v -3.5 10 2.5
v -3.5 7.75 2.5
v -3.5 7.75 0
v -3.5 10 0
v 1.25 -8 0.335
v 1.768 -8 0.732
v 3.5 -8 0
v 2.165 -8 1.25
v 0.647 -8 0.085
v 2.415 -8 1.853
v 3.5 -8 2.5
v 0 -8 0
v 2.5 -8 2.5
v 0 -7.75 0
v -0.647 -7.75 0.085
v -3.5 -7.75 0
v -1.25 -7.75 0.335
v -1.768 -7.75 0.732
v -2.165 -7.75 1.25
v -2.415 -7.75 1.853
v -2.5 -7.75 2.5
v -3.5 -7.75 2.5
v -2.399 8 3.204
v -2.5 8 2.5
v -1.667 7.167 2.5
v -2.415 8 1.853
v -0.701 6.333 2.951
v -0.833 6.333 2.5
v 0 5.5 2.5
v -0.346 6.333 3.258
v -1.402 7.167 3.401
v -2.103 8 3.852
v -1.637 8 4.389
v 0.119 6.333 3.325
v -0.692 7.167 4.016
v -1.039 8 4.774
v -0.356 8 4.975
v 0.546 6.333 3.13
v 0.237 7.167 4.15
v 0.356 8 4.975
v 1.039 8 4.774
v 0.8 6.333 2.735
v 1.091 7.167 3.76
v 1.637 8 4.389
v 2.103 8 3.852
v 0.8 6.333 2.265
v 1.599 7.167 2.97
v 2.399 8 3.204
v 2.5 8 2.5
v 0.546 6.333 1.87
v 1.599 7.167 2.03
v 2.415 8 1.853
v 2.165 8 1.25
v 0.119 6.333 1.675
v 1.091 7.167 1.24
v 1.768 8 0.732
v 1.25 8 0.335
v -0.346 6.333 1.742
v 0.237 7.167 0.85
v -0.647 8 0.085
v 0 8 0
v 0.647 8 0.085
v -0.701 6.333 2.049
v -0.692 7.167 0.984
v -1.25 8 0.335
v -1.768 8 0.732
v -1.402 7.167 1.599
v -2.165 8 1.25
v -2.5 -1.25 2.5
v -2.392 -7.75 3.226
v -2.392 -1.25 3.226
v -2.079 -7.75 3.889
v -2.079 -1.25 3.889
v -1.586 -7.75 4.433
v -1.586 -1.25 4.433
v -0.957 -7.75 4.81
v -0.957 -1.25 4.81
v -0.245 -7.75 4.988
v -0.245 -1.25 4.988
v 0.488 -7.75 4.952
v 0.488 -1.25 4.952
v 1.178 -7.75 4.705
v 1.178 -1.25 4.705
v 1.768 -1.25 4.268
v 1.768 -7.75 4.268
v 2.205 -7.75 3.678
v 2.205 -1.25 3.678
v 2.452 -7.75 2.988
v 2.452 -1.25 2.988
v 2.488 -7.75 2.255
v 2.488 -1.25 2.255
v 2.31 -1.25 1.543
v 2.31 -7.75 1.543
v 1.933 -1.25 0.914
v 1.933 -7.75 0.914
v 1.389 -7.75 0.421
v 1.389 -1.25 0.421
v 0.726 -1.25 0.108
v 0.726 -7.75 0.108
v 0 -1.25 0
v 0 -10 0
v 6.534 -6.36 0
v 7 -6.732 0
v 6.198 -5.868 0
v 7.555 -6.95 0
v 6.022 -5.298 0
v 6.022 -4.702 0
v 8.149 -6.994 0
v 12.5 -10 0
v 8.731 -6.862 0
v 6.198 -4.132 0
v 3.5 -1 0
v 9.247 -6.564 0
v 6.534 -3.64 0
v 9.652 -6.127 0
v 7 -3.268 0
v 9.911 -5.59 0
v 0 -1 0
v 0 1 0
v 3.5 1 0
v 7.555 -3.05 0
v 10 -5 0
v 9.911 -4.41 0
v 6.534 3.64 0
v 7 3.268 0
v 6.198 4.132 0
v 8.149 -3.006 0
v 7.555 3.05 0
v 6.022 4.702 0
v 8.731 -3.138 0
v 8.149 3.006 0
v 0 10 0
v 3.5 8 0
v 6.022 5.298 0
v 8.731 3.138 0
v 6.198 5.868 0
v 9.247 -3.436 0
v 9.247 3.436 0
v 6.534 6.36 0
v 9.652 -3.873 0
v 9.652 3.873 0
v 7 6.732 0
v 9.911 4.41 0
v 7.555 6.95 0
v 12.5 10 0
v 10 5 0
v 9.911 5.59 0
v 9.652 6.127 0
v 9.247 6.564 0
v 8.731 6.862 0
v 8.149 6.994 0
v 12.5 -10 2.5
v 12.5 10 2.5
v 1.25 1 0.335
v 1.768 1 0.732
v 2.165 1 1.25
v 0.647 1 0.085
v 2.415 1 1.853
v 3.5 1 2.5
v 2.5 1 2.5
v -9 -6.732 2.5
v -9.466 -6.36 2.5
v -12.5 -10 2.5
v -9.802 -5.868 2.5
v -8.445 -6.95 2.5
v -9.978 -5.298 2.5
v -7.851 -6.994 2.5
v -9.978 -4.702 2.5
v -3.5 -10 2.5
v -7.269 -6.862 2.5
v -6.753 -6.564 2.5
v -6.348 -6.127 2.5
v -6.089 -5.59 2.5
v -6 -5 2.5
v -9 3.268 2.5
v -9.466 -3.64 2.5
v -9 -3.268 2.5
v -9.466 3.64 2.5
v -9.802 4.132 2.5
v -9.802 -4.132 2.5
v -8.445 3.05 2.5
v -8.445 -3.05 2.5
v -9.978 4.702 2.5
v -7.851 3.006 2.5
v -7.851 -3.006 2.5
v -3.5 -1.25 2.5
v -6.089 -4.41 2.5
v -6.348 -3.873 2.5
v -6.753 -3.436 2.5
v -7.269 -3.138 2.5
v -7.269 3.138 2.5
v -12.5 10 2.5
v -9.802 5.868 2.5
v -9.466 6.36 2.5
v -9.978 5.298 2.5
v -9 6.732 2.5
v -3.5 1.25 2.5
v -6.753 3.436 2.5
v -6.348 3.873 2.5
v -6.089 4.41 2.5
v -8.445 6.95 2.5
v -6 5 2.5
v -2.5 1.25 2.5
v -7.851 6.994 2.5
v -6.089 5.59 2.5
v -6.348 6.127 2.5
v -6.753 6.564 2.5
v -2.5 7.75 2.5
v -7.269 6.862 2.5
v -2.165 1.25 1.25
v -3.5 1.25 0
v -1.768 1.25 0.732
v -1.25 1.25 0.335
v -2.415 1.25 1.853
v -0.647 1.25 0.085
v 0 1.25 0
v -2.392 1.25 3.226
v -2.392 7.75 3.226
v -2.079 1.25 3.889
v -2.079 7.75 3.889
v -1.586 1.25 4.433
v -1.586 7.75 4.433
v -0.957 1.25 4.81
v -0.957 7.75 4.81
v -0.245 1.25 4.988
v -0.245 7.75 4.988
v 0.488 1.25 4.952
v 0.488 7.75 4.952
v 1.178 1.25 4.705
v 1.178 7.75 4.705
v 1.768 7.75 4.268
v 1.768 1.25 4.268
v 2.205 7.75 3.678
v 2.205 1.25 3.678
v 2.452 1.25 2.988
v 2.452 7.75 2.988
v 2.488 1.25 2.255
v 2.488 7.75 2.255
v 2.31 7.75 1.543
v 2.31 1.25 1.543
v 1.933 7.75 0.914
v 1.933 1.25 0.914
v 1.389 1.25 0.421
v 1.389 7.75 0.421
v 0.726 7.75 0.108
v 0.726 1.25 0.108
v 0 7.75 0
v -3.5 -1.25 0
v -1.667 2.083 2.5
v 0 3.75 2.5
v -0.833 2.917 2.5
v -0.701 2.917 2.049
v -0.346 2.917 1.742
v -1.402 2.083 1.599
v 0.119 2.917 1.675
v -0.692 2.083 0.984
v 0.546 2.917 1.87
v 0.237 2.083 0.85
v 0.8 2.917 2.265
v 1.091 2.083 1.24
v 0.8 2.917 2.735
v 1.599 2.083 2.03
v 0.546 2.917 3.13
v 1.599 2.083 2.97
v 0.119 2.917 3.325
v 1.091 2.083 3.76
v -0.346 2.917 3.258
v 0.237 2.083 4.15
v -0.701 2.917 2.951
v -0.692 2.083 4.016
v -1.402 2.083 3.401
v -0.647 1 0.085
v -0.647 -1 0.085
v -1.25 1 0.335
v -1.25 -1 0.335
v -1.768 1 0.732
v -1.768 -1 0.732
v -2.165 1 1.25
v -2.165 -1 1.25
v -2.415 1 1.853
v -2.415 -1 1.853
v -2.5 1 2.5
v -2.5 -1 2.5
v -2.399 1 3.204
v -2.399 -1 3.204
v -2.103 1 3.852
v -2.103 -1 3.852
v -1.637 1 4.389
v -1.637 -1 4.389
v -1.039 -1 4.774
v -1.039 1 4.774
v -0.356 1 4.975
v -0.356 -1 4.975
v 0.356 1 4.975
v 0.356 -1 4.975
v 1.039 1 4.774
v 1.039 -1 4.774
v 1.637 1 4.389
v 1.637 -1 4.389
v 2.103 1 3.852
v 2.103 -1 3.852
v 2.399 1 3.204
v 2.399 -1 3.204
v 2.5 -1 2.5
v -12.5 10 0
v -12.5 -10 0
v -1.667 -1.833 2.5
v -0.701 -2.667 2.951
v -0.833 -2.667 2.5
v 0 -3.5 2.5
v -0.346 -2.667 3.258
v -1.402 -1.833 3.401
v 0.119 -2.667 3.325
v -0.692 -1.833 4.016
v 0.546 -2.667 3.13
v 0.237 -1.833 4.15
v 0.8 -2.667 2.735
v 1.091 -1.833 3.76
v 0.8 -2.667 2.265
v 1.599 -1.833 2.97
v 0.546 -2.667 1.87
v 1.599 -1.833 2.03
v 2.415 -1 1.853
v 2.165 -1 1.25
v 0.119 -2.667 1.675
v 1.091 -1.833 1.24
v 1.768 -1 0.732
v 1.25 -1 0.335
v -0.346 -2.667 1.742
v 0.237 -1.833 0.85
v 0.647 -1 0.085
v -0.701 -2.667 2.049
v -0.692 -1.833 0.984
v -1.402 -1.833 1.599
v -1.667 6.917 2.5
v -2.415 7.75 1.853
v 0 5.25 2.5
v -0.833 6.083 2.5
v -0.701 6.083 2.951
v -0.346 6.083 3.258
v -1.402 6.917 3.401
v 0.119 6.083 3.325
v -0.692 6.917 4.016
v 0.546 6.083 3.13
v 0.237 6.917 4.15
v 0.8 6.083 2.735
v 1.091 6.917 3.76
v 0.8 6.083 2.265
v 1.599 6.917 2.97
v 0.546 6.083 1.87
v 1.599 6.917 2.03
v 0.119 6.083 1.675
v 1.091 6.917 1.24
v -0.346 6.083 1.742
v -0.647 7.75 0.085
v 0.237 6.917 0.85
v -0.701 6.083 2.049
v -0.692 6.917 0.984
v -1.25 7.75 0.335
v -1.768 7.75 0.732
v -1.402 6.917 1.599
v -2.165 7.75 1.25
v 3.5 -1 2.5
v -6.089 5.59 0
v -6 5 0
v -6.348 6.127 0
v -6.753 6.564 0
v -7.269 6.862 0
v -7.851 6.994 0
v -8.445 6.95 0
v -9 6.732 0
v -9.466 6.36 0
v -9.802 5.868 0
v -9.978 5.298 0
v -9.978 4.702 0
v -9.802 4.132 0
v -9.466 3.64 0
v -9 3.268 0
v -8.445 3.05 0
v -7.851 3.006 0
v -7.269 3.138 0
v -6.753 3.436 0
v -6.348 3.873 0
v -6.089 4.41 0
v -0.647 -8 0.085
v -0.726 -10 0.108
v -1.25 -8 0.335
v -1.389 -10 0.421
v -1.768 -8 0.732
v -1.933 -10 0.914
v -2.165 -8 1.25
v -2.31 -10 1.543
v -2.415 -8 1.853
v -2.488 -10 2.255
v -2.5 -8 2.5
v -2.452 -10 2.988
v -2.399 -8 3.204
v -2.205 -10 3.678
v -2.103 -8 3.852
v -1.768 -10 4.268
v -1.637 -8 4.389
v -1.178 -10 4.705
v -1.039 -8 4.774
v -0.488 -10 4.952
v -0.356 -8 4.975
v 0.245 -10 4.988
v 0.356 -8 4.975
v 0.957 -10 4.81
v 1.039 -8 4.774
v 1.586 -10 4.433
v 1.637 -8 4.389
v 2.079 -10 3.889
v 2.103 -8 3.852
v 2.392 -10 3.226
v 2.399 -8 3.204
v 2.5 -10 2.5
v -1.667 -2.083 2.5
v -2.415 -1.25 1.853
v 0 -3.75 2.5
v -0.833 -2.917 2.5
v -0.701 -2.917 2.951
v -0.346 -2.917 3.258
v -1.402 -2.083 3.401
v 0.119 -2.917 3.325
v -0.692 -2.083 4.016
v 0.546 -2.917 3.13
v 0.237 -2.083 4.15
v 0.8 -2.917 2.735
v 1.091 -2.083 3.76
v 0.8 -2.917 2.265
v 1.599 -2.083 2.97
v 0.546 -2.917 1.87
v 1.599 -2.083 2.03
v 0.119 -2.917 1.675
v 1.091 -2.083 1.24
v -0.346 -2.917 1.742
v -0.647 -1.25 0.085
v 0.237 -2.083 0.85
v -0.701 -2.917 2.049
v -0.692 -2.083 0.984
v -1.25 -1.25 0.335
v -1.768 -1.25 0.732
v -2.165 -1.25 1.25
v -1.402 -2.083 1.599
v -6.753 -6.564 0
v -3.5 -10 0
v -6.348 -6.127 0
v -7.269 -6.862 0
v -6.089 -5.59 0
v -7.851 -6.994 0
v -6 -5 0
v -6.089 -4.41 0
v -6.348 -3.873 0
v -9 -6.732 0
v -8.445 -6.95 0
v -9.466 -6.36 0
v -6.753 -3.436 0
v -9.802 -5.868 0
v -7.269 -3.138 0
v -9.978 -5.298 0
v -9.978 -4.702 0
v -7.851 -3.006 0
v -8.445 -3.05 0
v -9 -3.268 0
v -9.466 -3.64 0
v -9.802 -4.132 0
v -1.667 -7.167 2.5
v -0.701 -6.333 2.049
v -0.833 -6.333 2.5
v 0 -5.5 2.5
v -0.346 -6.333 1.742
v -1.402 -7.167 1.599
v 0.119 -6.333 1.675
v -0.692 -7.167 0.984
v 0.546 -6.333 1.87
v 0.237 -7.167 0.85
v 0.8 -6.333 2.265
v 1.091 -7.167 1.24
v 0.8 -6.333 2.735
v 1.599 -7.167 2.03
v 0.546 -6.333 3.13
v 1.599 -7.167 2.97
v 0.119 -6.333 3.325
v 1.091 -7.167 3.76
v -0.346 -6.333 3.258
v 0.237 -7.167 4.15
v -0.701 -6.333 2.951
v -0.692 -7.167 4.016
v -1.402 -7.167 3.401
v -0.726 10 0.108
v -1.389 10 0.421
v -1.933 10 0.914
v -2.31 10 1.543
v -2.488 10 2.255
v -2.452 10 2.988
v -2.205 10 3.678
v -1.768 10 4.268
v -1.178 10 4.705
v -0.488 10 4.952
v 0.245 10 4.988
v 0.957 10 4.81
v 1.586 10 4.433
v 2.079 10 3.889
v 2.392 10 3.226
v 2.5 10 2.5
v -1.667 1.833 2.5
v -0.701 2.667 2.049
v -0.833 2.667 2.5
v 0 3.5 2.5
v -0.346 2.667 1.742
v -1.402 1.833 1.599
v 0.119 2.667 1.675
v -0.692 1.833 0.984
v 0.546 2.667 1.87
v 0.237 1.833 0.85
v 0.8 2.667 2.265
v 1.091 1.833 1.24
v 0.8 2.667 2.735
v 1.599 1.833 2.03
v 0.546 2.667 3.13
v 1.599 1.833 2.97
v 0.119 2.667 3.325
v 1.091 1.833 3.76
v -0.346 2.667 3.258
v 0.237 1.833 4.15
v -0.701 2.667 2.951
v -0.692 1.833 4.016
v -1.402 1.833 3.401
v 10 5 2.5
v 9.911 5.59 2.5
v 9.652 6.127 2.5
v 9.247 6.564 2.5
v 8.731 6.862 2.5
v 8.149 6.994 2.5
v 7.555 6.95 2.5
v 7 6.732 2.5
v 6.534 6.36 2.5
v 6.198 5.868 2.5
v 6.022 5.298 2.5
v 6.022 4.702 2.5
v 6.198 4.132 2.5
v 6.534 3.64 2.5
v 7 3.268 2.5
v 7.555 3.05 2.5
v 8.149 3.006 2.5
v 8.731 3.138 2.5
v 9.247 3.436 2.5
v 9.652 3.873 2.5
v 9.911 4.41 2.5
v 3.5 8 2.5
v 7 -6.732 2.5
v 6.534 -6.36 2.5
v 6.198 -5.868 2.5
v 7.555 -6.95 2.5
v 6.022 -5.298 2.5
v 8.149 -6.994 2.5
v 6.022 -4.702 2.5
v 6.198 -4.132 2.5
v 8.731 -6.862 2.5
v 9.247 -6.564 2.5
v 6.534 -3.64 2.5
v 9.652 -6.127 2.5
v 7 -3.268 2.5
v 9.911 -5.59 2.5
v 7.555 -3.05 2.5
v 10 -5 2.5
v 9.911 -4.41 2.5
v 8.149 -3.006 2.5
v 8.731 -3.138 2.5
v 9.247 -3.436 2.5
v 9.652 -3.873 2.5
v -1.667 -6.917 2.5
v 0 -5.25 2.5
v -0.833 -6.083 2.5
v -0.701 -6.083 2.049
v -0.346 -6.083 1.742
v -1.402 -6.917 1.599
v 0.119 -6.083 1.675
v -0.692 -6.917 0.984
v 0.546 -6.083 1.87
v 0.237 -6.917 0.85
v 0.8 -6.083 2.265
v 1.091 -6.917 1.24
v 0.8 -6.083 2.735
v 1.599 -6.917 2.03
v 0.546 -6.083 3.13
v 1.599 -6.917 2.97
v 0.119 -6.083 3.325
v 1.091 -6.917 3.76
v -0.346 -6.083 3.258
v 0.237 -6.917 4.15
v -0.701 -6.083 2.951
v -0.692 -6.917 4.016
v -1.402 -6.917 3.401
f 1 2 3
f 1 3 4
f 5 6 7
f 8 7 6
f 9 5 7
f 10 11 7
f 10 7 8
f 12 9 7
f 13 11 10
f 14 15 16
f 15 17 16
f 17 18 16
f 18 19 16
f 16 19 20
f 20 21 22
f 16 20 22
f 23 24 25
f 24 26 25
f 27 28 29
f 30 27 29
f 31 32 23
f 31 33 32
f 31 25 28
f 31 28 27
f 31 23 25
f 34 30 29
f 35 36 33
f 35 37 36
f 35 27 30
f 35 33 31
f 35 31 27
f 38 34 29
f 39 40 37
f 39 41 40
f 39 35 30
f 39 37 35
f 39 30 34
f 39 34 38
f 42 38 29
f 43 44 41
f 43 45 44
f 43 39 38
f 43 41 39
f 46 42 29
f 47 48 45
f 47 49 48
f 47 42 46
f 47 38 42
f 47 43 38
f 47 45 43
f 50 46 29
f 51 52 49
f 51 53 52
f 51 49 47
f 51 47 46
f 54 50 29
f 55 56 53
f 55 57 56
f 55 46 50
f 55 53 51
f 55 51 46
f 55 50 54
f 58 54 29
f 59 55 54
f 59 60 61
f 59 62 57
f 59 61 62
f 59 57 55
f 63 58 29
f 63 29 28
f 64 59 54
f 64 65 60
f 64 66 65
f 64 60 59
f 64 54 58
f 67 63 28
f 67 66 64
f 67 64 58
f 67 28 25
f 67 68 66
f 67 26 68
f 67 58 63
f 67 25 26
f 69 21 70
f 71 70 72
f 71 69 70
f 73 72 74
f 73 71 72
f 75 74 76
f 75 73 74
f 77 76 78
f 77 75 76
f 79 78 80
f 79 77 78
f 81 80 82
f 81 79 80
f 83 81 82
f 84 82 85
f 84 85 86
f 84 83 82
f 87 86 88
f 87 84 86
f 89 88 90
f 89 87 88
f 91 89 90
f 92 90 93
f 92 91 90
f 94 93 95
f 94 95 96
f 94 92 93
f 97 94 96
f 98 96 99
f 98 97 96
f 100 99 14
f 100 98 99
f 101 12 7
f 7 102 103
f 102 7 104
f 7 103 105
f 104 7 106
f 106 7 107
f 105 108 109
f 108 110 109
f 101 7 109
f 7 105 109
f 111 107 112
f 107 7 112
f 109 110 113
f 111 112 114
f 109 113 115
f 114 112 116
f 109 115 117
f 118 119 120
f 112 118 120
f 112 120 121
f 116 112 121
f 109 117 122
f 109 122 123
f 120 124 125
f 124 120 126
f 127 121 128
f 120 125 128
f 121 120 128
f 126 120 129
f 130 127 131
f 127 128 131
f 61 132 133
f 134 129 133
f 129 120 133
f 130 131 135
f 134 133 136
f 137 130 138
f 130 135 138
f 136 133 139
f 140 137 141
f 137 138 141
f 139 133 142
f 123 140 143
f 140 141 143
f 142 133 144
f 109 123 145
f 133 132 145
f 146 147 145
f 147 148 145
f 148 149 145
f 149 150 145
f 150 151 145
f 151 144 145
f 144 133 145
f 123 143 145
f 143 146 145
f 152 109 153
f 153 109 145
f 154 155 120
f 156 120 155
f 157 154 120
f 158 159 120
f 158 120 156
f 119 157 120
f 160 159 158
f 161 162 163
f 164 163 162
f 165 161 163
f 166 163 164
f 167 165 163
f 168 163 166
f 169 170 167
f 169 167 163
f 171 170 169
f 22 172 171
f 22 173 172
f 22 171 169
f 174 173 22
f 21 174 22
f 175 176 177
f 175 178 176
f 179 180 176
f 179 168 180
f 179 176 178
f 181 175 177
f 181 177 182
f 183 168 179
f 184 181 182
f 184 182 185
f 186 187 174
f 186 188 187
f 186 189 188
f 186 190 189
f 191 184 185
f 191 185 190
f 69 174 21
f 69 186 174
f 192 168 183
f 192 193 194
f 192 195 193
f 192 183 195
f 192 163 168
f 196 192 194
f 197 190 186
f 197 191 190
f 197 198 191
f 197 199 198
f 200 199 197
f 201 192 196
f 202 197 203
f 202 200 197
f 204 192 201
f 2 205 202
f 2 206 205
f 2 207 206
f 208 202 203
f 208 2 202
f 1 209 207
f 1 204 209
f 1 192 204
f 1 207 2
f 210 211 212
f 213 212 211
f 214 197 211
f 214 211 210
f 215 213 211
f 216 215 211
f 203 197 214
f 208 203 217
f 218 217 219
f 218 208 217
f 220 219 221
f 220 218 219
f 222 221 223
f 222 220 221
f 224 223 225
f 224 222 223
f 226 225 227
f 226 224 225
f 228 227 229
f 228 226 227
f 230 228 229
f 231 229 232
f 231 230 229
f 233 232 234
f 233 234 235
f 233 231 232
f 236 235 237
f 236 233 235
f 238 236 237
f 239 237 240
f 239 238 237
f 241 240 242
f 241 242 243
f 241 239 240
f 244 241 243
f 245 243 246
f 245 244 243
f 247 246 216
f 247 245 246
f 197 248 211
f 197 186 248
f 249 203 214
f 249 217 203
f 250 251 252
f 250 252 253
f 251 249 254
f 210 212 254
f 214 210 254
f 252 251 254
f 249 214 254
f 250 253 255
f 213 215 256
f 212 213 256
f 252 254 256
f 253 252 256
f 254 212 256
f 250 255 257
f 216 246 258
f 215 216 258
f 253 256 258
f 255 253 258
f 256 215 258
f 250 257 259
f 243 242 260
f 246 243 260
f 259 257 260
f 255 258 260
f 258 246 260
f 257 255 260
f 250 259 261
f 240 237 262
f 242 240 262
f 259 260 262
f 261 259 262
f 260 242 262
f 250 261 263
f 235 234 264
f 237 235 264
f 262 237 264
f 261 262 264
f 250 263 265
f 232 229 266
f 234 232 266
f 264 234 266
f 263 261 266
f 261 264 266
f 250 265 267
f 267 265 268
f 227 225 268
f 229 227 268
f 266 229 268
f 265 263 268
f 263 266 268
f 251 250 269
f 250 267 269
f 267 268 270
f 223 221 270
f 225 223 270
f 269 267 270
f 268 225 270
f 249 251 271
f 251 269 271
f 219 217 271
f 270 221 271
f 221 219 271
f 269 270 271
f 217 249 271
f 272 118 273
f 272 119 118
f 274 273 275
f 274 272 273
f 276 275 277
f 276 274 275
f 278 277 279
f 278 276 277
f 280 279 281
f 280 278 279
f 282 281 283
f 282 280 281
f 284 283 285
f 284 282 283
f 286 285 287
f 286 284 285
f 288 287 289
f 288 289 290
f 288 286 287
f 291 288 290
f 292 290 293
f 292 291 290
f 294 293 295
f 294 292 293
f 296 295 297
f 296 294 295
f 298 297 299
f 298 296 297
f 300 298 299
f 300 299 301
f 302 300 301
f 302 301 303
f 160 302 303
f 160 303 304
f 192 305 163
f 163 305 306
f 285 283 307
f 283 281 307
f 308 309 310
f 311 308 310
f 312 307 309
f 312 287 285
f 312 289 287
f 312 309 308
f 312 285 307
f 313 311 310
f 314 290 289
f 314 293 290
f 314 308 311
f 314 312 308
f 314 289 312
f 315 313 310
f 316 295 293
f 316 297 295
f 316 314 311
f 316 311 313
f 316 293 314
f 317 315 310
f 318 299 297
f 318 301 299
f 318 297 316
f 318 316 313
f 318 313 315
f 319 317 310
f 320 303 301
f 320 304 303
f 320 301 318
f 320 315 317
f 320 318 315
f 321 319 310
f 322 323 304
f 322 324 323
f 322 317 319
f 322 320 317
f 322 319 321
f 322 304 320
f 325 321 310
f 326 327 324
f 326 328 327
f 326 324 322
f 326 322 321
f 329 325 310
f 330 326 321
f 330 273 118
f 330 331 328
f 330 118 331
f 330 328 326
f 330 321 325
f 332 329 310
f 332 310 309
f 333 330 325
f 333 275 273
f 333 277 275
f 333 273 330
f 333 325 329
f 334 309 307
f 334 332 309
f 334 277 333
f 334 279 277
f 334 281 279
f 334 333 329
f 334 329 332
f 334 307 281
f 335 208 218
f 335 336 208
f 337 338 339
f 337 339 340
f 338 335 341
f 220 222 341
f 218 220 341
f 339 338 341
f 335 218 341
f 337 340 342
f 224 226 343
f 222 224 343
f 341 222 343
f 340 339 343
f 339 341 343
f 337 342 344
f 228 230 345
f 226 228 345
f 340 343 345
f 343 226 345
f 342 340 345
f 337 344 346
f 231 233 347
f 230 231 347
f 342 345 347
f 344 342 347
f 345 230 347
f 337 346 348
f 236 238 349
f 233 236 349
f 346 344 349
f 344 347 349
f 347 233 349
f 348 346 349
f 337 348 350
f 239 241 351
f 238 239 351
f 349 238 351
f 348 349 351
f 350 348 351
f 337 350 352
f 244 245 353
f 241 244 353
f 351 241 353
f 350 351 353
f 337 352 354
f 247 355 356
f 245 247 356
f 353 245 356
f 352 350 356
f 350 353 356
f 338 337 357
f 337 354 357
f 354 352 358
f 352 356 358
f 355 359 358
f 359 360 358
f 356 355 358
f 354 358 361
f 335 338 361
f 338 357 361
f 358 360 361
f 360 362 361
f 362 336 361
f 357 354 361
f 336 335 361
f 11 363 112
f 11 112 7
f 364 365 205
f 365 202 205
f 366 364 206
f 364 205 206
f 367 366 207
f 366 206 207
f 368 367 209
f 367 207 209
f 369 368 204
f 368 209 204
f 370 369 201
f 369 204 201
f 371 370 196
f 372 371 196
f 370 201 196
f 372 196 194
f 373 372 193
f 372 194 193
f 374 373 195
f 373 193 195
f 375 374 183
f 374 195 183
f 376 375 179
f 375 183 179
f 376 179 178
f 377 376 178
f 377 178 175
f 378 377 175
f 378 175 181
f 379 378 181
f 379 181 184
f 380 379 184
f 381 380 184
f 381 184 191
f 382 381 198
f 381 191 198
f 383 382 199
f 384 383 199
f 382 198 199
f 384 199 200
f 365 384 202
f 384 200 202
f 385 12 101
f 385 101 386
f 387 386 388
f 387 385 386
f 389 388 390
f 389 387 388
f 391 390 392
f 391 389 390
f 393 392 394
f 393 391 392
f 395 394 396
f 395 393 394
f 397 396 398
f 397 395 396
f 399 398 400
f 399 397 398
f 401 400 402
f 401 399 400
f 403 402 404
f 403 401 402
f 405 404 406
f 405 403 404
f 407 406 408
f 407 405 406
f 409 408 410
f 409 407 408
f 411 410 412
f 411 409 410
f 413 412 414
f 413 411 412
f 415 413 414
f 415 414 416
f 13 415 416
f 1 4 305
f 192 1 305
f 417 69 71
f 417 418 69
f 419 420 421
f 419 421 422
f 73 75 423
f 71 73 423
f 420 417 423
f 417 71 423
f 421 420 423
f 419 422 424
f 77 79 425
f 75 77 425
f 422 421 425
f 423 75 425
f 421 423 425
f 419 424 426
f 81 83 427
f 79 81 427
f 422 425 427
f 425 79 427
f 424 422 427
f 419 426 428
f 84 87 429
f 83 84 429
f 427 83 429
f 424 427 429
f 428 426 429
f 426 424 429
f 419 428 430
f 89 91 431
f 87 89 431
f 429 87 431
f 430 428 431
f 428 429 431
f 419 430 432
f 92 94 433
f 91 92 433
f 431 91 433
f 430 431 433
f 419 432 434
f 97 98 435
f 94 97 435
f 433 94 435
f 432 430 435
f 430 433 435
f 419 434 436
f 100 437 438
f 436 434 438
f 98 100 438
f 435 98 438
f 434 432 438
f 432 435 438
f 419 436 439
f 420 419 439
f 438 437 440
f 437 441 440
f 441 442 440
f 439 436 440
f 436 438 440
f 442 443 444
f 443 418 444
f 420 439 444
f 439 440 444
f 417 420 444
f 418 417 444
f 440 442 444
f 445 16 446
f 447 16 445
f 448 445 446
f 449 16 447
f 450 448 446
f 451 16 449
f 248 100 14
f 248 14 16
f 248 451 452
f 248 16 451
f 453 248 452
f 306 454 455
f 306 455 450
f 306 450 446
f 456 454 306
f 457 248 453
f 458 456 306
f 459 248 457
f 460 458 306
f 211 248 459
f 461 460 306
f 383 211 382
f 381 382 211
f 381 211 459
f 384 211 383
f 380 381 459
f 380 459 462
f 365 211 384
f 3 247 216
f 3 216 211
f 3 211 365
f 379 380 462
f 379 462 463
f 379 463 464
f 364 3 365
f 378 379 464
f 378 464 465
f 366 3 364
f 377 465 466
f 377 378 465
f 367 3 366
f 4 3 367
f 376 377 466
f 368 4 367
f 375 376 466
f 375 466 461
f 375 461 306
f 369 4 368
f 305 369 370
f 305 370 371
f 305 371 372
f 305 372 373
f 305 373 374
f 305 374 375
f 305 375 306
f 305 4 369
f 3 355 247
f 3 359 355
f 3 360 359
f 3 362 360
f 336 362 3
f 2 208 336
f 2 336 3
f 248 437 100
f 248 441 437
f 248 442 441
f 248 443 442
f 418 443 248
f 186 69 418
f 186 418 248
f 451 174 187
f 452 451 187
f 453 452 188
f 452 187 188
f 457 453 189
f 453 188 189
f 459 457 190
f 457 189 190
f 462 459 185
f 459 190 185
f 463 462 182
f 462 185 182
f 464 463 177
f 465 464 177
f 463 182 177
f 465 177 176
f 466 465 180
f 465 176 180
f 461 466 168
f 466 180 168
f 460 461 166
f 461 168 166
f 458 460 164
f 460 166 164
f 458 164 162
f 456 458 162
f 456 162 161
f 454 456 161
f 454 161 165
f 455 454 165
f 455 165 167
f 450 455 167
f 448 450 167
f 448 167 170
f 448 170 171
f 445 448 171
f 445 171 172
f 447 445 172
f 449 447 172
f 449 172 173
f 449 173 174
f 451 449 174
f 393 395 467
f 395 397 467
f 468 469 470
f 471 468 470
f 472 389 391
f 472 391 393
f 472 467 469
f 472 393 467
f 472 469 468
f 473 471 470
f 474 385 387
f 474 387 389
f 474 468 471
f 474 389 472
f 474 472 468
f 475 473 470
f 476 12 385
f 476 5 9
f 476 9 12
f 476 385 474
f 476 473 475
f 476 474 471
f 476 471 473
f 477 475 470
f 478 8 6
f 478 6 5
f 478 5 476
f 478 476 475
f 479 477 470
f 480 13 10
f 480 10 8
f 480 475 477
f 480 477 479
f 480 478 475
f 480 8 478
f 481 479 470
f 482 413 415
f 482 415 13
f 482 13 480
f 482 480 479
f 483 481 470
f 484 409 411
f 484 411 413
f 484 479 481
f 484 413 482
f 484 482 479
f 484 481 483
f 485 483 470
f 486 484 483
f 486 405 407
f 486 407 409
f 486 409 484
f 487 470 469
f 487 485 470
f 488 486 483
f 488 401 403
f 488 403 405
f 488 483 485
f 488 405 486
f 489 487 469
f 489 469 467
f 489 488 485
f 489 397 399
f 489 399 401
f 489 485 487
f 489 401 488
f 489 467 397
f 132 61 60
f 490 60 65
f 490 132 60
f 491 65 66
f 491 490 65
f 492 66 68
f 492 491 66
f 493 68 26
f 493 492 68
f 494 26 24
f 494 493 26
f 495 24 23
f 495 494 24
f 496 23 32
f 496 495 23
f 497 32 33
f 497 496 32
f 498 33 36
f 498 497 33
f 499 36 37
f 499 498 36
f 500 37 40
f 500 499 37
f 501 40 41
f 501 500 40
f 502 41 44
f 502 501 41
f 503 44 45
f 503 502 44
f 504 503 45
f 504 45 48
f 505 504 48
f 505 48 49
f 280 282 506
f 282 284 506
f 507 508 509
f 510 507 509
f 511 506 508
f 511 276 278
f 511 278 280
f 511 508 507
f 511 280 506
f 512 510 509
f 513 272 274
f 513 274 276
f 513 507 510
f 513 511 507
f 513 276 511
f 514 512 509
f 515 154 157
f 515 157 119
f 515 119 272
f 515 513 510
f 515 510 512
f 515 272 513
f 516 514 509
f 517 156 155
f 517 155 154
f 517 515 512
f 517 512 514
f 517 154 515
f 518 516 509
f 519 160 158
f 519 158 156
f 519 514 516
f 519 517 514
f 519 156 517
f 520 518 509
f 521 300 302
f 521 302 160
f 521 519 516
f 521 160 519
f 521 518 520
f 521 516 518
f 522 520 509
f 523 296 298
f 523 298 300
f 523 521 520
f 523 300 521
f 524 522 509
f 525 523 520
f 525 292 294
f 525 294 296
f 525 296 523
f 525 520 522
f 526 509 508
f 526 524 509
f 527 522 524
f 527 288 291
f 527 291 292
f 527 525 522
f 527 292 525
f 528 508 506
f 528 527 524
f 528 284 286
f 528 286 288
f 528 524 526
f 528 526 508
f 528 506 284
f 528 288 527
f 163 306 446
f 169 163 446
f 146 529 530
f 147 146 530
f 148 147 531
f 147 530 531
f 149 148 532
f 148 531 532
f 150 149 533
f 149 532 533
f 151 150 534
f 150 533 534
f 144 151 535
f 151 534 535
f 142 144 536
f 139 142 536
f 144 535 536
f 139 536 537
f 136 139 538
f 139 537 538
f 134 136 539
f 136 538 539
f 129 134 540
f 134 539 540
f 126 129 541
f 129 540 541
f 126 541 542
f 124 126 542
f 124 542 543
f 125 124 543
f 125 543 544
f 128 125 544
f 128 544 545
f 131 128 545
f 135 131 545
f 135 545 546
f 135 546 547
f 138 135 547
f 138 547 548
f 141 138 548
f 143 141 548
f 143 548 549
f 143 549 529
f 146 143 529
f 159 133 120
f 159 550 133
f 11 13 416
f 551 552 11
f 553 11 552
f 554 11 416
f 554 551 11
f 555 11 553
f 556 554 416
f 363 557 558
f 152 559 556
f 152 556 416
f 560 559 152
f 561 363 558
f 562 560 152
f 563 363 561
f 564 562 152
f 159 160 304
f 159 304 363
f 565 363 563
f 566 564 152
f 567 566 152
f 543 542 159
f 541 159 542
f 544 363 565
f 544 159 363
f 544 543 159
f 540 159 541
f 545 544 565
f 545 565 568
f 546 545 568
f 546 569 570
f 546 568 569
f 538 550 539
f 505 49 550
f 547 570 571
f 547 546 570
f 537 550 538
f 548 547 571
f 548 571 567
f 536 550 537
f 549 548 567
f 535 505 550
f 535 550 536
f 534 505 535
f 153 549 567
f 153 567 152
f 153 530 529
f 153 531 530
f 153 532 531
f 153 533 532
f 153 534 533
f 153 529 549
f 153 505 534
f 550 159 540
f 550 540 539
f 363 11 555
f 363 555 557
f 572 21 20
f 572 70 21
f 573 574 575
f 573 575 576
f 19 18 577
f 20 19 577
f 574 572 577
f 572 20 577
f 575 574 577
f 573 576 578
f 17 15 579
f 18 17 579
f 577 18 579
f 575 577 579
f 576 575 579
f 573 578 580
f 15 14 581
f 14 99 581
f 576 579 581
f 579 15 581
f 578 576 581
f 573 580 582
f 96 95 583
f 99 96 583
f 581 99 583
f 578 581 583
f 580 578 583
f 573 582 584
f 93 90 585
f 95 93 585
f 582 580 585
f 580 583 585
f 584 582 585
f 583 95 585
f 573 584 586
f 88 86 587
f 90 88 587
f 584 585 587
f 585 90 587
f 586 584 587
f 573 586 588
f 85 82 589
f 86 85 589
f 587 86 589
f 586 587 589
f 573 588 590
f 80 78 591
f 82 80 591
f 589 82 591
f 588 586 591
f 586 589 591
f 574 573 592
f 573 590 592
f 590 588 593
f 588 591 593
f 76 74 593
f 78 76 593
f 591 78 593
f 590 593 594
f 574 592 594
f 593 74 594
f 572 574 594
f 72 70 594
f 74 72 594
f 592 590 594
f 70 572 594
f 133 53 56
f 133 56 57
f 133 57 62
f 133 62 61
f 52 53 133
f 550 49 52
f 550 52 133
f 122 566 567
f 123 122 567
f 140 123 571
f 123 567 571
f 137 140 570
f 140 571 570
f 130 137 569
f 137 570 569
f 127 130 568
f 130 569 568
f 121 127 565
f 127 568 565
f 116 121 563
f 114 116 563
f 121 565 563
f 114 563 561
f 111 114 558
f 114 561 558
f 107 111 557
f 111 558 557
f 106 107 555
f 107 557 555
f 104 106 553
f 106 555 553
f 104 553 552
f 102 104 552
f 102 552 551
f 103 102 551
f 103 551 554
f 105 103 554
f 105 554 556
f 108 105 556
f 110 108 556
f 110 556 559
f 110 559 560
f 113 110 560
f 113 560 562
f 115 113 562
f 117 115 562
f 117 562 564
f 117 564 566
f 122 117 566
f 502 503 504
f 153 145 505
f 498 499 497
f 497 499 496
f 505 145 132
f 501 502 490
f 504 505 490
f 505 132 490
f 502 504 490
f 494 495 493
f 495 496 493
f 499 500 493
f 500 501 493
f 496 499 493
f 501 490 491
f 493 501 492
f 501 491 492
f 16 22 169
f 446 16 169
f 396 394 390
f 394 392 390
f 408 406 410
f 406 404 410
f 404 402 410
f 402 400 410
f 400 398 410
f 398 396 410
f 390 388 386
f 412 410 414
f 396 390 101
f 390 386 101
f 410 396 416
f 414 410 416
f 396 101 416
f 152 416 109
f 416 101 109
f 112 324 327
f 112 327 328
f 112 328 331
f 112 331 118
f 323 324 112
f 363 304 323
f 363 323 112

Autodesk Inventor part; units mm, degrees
ref_plane "YZ Plane" through (0, 0, 0) normal (1, 0, 0) x (0, 1, 0)
sketch "Sketch1" plane through (0, 0, 0) normal (0, 0, 1) x (1, 0, 0)
  line L0 (12.5, -10) -> (12.5, 10)
  line L1 (-12.5, 10) -> (-12.5, -10)
  line L2 (-12.5, -10) -> (12.5, 10) construction
  line L3 (12.5, -10) -> (-12.5, 10) construction
  line L4 (2.5, -10) -> (2.5, 10)
  line L5 (-2.5, 10) -> (-2.5, -10)
  line L6 (-2.5, -10) -> (2.5, 10) construction
  line L7 (2.5, -10) -> (-2.5, 10) construction
  line L8 (12.5, 10) -> (2.5, 10)
  line L9 (-2.5, 10) -> (-12.5, 10)
  line L10 (-12.5, -10) -> (-2.5, -10)
  line L11 (2.5, -10) -> (12.5, -10)
  point P0 (0, 0)
  dimension "d0" = 25
  dimension "d1" = 20
  dimension "d2" = 5
  dimension "d3" = 20
  dimension "d4" = 38.66
  dimension "d5" = 75.964
extrude "Extrusion1" add sketch "Sketch1" along normal blind 2.5
sketch "Sketch2" plane through (0, 0, 2.5) normal (0, 0, 1) x (1, 0, 0)
  line L0 (-2.5, -10) -> (-2.5, 10) projected
  line L1 (12.5, 10) -> (2.5, 10) projected
  line L2 (-2.5, 10) -> (0, 10)
  line L3 (2.5, 10) -> (2.5, -10) projected
  line L4 (-2.5, 10) -> (-2.5, 8)
  line L5 (-2.5, 8) -> (0, 5.5)
  line L6 (0, 5.5) -> (0, 10)
  line L7 (-2.5, 7.75) -> (0, 5.25)
  line L8 (-2.5, 7.75) -> (1.5, 7.75) construction
  line L9 (-2.5, 0) -> (-2.5, 1)
  line L10 (-2.5, 1) -> (0, 3.5)
  line L11 (0, 0) -> (0, 3.5)
  line L12 (-2.5, 1) -> (-2.5, 1.25) construction
  line L13 (-2.5, 1.25) -> (0, 3.75)
  line L14 (0, 3.75) -> (0, 5.25)
  line L15 (-2.5, 1.25) -> (-2.5, 7.75)
  line L16 (-2.5, -10) -> (0, -10)
  line L17 (-2.5, -10) -> (-2.5, -8)
  line L18 (-2.5, -8) -> (0, -5.5)
  line L19 (0, -5.5) -> (0, -10)
  line L20 (-2.5, -7.75) -> (0, -5.25)
  line L21 (-2.5, 0) -> (-2.5, -1)
  line L22 (-2.5, -1) -> (0, -3.5)
  line L23 (0, 0) -> (0, -3.5)
  line L24 (-2.5, -1) -> (-2.5, -1.25) construction
  line L25 (-2.5, -1.25) -> (0, -3.75)
  line L26 (0, -3.75) -> (0, -5.25)
  line L27 (-2.5, -1.25) -> (-2.5, -7.75)
  dimension "d11" = 2
  dimension "d12" = 135
  dimension "d14" = 45
  dimension "d15" = 1
  dimension "d17" = 135
  dimension "d18" = 0.25
  dimension "d19" = 90
  dimension "d20" = 90
  dimension "d21" = 90
  dimension "d22" = 90
  dimension "d23" = 90
  dimension "d24" = 90
  dimension "d25" = 90
  dimension "d26" = 2.5
  dimension "d27" = 2.25
  dimension "d28" = 2.5
  dimension "d29" = 6.1872
  dimension "d30" = 6.364
  dimension "d31" = 6.1872
  dimension "d32" = 6.364
  dimension "d33" = 12.5
  dimension "d34" = 12.5
  dimension "d35" = 1
revolve "Revolution1" add sketch "Sketch2" angle 360 about axis through (0, 0, 2.5) along (0, 1, 0)
sketch "Sketch4" plane through (0, 0, 2.5) normal (0, 0, 1) x (1, 0, 0)
  line L0 (-2.5, -8) -> (-2.5, 8) projected
  line L1 (-2.5, 7.75) -> (-3.5, 7.75)
  line L2 (-3.5, 7.75) -> (-3.5, 10)
  line L3 (-3.5, 10) -> (-2.5, 10)
  line L4 (-2.5, 10) -> (-2.5, 7.75)
  line L5 (2.5, 10) -> (2.5, 8) projected
  line L6 (2.5, 8) -> (3.5, 8)
  line L7 (3.5, 8) -> (3.5, 1)
  line L8 (3.5, 1) -> (2.5, 1)
  line L9 (2.5, 1) -> (2.5, 8)
  line L10 (-2.5, -7.75) -> (-2.5, -1.25) projected
  line L11 (-2.5, -1.25) -> (-3.5, -1.25)
  line L12 (-3.5, -1.25) -> (-3.5, 1.25)
  line L13 (-3.5, 1.25) -> (-2.5, 1.25)
  line L14 (-2.5, 1.25) -> (-2.5, -1.25)
  line L15 (2.5, 1) -> (2.5, -1) projected
  line L16 (2.5, -1) -> (3.5, -1)
  line L17 (3.5, -1) -> (3.5, -8)
  line L18 (3.5, -8) -> (2.5, -8)
  line L19 (2.5, -8) -> (2.5, -1)
  line L20 (2.5, -7.75) -> (2.5, -7.75) projected
  line L21 (-2.5, -10) -> (-12.5, -10) projected
  line L22 (-2.5, -7.75) -> (-3.5, -7.75)
  line L23 (-3.5, -7.75) -> (-3.5, -10)
  line L24 (-3.5, -10) -> (-2.5, -10)
  line L25 (-2.5, -10) -> (-2.5, -7.75)
  point P0 (0, 0)
  dimension "d39" = 1
  dimension "d40" = 2.25
  dimension "d41" = 1
  dimension "d42" = 7
  dimension "d43" = 1
  dimension "d44" = 2.5
  dimension "d45" = 1
  dimension "d46" = 7
  dimension "d47" = 1
extrude "Extrusion3" cut sketch "Sketch4" against normal blind 2.5
sketch "Sketch5" plane through (0, 0, 2.5) normal (0, 0, 1) x (1, 0, 0)
  circle A0 centre (8, -5) radius 2
  line L0 (2.5, -10) -> (12.5, -10) projected
  line L1 (12.5, -10) -> (12.5, 10) projected
  line L2 (-12.5, 10) -> (-12.5, -10) projected
  line L3 (-12.5, -10) -> (-3.5, -10) projected
  circle A1 centre (8, 5) radius 2
  circle A2 centre (-8, -5) radius 2
  circle A3 centre (-8, 5) radius 2
  point P0 (0, 0)
  dimension "d50" = 4
  dimension "d51" = 5
  dimension "d52" = 4.5
  dimension "d57" = 10
  dimension "d60" = 16
extrude "Extrusion4" cut sketch "Sketch5" against normal blind 2.5
sketch "Sketch6" plane through (0, 0, 0) normal (0, 0, -1) x (-1, 0, 0)
  line L0 (2.5, 10) -> (-2.5, 10) projected
  line L1 (2.5, 8) -> (-2.5, 8) projected
  line L2 (-2.5, 10) -> (0, 10)
  line L3 (0, 10) -> (0, 8)
  line L4 (0, 8) -> (-2.5, 8)
  line L5 (-2.5, 8) -> (-2.5, 10)
  line L6 (2.5, -1) -> (-2.5, -1) projected
  line L7 (-2.5, 1) -> (0, 1)
  line L8 (0, 1) -> (0, -1)
  line L9 (0, -1) -> (-2.5, -1)
  line L10 (-2.5, -1) -> (-2.5, 1)
  line L11 (-2.5, -8) -> (-2.5, -10) projected
  line L12 (2.5, -10) -> (-2.5, -10) projected
  line L13 (-2.5, -8) -> (0, -8)
  line L14 (0, -8) -> (0, -10)
  line L15 (0, -10) -> (-2.5, -10)
  line L16 (-2.5, -10) -> (-2.5, -8)
  line L17 (2.5, -1.25) -> (0, -3.75) projected
  line L18 (0, -3.75) -> (2.5, -3.75)
  line L19 (2.5, -3.75) -> (2.5, -5.25)
  line L20 (2.5, -5.25) -> (0, -5.25)
  line L21 (0, -5.25) -> (0, -3.75)
  line L22 (2.5, 7.75) -> (0, 5.25) projected
  line L23 (0, 5.25) -> (2.5, 5.25)
  line L24 (2.5, 5.25) -> (2.5, 3.75)
  line L25 (2.5, 3.75) -> (0, 3.75)
  line L26 (0, 3.75) -> (0, 5.25)
  point P0 (0, 0)
  dimension "d65" = 5
  dimension "d66" = 6.25
  dimension "d67" = 15.25
extrude "Extrusion5" add sketch "Sketch6" against normal blind 2.5
ref_plane "Work Plane1" through (-2.5, -4.5, 0) normal (0, -1, 0) x (1, 0, 0)
sketch "Sketch7" plane through (-2.5, -4.5, 0) normal (0, -1, 0) x (1, 0, 0)
  line L0 (2.5, 0) -> (0, 0) projected
  line L1 (0, 0) -> (2.5, 0)
  line L2 (0, 0) -> (0, 2.5) projected
  line L3 (0, 0) -> (0, 2.5)
  line L4 (15, 0) -> (2.5, 0) projected
  arc A0 (0, 2.5) -> (2.5, 0) centre (2.5, 2.5) ccw
extrude "Extrusion6" add sketch "Sketch7" along normal mid plane 6.5
ref_plane "Work Plane2" through (-2.5, 4.5, 0) normal (0, -1, 0) x (1, 0, 0)
sketch "Sketch8" plane through (-2.5, 4.5, 0) normal (0, -1, 0) x (1, 0, 0)
  arc A0 (0, 2.5) -> (2.5, 0) centre (2.5, 2.5) ccw projected
  line L0 (0, 2.5) -> (0, 0)
  line L1 (0, 0) -> (2.5, 0)
  line L2 (0, 2.5) -> (-1, 2.5) projected
  arc A1 (0, 2.5) -> (2.5, 0) centre (2.5, 2.5) ccw
extrude "Extrusion7" add sketch "Sketch8" along normal mid plane 6.5
properties part number "26 scharnier 0.2 mm speling"
